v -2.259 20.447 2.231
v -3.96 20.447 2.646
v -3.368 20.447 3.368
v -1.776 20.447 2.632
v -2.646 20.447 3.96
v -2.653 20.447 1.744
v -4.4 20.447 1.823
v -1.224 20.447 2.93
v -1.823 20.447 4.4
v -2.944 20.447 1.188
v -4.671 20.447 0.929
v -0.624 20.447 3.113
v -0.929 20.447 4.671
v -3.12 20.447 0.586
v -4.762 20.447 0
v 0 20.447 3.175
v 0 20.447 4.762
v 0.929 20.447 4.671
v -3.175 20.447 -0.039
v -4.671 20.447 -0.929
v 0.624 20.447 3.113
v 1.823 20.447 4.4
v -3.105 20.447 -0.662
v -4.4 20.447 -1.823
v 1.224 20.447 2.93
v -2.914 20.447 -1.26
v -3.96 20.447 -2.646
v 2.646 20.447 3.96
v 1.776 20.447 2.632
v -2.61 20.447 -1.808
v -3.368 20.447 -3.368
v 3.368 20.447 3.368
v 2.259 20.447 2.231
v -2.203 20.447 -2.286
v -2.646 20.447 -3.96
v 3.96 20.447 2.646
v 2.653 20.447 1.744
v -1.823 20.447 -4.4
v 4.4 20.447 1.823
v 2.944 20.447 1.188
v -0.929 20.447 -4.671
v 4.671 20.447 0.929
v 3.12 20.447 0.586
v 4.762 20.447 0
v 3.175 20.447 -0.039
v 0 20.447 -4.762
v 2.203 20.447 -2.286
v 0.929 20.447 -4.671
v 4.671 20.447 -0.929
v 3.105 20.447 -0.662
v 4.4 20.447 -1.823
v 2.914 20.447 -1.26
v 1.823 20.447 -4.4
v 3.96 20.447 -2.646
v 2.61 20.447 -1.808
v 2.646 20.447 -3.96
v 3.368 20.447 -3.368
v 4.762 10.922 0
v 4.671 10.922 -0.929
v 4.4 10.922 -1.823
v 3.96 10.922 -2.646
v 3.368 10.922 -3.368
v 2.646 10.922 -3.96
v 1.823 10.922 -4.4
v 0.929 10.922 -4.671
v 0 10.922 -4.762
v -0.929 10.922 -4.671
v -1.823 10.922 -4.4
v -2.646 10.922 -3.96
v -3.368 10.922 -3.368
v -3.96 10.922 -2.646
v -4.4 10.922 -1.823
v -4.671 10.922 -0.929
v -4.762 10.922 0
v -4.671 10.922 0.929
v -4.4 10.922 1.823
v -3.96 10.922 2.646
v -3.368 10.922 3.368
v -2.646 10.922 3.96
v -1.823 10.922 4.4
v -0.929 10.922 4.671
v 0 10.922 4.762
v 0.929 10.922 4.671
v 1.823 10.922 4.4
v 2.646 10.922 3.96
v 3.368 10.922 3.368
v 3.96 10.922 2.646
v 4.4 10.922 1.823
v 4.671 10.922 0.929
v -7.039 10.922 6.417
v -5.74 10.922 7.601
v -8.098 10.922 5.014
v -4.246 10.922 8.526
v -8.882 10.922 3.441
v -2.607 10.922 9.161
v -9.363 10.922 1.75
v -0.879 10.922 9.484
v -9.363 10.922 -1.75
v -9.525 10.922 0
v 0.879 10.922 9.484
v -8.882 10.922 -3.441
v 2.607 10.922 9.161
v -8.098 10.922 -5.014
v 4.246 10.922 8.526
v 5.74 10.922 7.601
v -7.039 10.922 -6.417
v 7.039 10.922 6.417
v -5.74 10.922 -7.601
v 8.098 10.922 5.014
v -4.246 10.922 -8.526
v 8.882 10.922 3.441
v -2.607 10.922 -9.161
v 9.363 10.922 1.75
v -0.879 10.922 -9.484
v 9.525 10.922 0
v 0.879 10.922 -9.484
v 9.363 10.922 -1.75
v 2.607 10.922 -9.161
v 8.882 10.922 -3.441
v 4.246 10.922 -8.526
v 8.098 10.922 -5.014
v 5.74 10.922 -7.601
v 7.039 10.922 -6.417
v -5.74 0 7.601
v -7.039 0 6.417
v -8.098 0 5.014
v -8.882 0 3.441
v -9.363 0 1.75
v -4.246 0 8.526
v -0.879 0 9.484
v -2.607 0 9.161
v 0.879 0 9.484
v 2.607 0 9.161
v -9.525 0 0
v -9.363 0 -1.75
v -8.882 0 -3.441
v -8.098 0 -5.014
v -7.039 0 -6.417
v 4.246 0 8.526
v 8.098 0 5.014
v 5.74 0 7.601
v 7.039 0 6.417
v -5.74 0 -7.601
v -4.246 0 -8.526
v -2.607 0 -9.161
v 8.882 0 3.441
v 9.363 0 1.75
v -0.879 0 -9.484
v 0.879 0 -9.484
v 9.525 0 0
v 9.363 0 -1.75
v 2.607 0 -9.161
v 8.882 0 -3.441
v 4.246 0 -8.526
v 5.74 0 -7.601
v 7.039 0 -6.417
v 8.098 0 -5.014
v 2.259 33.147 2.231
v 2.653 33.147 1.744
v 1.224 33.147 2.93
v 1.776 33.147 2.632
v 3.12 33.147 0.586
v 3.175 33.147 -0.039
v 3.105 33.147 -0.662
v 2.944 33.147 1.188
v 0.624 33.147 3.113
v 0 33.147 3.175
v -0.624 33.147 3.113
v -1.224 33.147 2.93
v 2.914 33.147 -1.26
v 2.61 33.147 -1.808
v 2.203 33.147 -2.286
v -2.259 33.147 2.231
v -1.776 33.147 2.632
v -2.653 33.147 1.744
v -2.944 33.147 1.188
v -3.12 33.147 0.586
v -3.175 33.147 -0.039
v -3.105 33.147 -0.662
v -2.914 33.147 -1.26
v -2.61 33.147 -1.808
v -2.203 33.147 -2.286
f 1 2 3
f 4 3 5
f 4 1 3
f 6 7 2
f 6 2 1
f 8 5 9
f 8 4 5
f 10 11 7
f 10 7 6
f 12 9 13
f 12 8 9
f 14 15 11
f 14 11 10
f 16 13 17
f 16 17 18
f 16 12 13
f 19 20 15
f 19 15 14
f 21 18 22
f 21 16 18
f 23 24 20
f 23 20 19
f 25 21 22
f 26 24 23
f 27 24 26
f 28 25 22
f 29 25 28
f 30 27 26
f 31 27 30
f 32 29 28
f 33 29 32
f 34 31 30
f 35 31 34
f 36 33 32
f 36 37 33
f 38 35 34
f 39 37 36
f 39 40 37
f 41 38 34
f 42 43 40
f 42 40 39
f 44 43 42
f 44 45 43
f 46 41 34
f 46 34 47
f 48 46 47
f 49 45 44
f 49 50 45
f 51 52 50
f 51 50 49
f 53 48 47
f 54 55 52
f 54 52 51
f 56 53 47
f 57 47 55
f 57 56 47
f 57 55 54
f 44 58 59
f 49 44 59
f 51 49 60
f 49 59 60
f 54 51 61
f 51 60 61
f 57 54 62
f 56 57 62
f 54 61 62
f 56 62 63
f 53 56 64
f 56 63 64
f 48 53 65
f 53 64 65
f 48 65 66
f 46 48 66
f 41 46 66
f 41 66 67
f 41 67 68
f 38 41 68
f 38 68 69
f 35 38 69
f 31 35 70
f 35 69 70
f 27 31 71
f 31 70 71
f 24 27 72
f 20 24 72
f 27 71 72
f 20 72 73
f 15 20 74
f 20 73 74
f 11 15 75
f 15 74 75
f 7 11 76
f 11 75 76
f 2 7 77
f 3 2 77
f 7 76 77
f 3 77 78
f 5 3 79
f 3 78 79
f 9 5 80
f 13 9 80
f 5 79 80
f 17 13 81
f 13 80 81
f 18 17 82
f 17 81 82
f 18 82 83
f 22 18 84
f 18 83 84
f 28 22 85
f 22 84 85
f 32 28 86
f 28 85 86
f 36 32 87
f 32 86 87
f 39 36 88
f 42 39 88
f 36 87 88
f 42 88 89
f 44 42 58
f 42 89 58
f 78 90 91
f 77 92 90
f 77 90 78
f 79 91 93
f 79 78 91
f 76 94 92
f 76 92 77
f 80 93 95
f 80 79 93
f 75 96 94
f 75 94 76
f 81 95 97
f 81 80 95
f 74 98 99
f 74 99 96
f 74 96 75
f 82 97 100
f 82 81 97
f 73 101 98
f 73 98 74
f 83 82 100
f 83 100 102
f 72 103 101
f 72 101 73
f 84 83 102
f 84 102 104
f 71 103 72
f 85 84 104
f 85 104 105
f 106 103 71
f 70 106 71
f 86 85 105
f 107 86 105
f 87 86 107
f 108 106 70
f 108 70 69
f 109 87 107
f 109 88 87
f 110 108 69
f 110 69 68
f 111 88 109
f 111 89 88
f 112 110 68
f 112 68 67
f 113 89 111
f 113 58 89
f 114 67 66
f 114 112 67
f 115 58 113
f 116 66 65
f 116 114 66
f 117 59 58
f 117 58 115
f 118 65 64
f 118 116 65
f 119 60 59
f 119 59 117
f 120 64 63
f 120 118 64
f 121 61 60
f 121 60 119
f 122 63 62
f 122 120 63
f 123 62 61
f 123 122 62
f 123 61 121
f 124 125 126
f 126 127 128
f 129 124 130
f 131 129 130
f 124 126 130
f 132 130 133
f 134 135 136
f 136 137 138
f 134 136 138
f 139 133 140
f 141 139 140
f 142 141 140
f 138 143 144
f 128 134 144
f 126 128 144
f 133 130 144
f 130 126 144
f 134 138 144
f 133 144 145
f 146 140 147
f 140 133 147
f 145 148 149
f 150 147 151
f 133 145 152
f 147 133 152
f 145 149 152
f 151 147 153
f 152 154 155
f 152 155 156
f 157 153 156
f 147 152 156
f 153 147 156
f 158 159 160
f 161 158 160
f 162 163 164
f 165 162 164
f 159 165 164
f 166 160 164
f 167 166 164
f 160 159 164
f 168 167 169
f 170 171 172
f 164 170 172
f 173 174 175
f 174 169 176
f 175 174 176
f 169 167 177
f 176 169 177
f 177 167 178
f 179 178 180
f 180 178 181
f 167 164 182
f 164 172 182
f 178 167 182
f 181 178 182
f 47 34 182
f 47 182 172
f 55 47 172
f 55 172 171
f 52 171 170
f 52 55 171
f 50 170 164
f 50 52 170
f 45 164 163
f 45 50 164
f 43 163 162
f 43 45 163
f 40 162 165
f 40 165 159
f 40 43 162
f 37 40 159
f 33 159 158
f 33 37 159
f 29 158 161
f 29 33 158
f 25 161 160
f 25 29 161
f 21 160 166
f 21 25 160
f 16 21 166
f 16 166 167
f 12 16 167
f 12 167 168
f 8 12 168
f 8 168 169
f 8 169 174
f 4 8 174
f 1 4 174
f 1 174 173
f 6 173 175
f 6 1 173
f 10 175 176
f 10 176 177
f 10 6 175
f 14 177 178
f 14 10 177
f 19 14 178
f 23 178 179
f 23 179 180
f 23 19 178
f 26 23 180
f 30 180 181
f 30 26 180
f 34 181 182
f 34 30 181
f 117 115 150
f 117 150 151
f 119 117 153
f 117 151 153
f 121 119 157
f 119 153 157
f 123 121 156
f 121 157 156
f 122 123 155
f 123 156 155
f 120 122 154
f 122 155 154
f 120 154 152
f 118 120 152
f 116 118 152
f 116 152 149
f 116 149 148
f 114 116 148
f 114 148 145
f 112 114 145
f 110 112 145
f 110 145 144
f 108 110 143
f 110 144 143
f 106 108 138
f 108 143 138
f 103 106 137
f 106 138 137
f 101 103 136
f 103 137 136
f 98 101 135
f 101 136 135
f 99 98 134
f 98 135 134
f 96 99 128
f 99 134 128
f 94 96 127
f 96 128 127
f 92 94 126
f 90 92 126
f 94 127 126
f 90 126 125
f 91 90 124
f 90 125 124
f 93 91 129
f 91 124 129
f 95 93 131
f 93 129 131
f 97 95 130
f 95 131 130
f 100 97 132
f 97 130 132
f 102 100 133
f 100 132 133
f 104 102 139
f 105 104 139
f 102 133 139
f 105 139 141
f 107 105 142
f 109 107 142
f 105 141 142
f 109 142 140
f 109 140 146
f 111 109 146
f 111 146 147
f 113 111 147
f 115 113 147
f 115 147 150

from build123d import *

# Parameters (mm, degrees)
SKETCH1_R           = 9.525
BOSS_EXTRUDE1_DEPTH = 10.922
SKETCH2_R           = 4.7625
BOSS_EXTRUDE2_DEPTH = 9.525
BOSS_EXTRUDE3_DEPTH = 12.7


with BuildPart() as part:
    # Sketch1 → Boss-Extrude1 (new body)
    with BuildSketch(Plane(origin=(0, 0, 0), x_dir=(1, 0, 0), z_dir=(0, 1, 0))):
        Circle(SKETCH1_R)
    extrude(amount=BOSS_EXTRUDE1_DEPTH)

    # Sketch2 → Boss-Extrude2 (add)
    with BuildSketch(Plane(origin=(0, 10.922, 0), x_dir=(1, 0, 0), z_dir=(0, 1, 0))):
        Circle(SKETCH2_R)
    extrude(amount=BOSS_EXTRUDE2_DEPTH)

    # Sketch3 → Boss-Extrude3 (add)
    with BuildSketch(Plane(origin=(0, 20.447, 0), x_dir=(1, 0, 0), z_dir=(0, 1, 0))):
        with BuildLine():
            Line((-2.20336765, 2.286), (2.20336765, 2.286))
            ThreePointArc((2.20336765, 2.286), (0, -3.175), (-2.20336765, 2.286))
        make_face()
    extrude(amount=BOSS_EXTRUDE3_DEPTH)


solid = part.part
